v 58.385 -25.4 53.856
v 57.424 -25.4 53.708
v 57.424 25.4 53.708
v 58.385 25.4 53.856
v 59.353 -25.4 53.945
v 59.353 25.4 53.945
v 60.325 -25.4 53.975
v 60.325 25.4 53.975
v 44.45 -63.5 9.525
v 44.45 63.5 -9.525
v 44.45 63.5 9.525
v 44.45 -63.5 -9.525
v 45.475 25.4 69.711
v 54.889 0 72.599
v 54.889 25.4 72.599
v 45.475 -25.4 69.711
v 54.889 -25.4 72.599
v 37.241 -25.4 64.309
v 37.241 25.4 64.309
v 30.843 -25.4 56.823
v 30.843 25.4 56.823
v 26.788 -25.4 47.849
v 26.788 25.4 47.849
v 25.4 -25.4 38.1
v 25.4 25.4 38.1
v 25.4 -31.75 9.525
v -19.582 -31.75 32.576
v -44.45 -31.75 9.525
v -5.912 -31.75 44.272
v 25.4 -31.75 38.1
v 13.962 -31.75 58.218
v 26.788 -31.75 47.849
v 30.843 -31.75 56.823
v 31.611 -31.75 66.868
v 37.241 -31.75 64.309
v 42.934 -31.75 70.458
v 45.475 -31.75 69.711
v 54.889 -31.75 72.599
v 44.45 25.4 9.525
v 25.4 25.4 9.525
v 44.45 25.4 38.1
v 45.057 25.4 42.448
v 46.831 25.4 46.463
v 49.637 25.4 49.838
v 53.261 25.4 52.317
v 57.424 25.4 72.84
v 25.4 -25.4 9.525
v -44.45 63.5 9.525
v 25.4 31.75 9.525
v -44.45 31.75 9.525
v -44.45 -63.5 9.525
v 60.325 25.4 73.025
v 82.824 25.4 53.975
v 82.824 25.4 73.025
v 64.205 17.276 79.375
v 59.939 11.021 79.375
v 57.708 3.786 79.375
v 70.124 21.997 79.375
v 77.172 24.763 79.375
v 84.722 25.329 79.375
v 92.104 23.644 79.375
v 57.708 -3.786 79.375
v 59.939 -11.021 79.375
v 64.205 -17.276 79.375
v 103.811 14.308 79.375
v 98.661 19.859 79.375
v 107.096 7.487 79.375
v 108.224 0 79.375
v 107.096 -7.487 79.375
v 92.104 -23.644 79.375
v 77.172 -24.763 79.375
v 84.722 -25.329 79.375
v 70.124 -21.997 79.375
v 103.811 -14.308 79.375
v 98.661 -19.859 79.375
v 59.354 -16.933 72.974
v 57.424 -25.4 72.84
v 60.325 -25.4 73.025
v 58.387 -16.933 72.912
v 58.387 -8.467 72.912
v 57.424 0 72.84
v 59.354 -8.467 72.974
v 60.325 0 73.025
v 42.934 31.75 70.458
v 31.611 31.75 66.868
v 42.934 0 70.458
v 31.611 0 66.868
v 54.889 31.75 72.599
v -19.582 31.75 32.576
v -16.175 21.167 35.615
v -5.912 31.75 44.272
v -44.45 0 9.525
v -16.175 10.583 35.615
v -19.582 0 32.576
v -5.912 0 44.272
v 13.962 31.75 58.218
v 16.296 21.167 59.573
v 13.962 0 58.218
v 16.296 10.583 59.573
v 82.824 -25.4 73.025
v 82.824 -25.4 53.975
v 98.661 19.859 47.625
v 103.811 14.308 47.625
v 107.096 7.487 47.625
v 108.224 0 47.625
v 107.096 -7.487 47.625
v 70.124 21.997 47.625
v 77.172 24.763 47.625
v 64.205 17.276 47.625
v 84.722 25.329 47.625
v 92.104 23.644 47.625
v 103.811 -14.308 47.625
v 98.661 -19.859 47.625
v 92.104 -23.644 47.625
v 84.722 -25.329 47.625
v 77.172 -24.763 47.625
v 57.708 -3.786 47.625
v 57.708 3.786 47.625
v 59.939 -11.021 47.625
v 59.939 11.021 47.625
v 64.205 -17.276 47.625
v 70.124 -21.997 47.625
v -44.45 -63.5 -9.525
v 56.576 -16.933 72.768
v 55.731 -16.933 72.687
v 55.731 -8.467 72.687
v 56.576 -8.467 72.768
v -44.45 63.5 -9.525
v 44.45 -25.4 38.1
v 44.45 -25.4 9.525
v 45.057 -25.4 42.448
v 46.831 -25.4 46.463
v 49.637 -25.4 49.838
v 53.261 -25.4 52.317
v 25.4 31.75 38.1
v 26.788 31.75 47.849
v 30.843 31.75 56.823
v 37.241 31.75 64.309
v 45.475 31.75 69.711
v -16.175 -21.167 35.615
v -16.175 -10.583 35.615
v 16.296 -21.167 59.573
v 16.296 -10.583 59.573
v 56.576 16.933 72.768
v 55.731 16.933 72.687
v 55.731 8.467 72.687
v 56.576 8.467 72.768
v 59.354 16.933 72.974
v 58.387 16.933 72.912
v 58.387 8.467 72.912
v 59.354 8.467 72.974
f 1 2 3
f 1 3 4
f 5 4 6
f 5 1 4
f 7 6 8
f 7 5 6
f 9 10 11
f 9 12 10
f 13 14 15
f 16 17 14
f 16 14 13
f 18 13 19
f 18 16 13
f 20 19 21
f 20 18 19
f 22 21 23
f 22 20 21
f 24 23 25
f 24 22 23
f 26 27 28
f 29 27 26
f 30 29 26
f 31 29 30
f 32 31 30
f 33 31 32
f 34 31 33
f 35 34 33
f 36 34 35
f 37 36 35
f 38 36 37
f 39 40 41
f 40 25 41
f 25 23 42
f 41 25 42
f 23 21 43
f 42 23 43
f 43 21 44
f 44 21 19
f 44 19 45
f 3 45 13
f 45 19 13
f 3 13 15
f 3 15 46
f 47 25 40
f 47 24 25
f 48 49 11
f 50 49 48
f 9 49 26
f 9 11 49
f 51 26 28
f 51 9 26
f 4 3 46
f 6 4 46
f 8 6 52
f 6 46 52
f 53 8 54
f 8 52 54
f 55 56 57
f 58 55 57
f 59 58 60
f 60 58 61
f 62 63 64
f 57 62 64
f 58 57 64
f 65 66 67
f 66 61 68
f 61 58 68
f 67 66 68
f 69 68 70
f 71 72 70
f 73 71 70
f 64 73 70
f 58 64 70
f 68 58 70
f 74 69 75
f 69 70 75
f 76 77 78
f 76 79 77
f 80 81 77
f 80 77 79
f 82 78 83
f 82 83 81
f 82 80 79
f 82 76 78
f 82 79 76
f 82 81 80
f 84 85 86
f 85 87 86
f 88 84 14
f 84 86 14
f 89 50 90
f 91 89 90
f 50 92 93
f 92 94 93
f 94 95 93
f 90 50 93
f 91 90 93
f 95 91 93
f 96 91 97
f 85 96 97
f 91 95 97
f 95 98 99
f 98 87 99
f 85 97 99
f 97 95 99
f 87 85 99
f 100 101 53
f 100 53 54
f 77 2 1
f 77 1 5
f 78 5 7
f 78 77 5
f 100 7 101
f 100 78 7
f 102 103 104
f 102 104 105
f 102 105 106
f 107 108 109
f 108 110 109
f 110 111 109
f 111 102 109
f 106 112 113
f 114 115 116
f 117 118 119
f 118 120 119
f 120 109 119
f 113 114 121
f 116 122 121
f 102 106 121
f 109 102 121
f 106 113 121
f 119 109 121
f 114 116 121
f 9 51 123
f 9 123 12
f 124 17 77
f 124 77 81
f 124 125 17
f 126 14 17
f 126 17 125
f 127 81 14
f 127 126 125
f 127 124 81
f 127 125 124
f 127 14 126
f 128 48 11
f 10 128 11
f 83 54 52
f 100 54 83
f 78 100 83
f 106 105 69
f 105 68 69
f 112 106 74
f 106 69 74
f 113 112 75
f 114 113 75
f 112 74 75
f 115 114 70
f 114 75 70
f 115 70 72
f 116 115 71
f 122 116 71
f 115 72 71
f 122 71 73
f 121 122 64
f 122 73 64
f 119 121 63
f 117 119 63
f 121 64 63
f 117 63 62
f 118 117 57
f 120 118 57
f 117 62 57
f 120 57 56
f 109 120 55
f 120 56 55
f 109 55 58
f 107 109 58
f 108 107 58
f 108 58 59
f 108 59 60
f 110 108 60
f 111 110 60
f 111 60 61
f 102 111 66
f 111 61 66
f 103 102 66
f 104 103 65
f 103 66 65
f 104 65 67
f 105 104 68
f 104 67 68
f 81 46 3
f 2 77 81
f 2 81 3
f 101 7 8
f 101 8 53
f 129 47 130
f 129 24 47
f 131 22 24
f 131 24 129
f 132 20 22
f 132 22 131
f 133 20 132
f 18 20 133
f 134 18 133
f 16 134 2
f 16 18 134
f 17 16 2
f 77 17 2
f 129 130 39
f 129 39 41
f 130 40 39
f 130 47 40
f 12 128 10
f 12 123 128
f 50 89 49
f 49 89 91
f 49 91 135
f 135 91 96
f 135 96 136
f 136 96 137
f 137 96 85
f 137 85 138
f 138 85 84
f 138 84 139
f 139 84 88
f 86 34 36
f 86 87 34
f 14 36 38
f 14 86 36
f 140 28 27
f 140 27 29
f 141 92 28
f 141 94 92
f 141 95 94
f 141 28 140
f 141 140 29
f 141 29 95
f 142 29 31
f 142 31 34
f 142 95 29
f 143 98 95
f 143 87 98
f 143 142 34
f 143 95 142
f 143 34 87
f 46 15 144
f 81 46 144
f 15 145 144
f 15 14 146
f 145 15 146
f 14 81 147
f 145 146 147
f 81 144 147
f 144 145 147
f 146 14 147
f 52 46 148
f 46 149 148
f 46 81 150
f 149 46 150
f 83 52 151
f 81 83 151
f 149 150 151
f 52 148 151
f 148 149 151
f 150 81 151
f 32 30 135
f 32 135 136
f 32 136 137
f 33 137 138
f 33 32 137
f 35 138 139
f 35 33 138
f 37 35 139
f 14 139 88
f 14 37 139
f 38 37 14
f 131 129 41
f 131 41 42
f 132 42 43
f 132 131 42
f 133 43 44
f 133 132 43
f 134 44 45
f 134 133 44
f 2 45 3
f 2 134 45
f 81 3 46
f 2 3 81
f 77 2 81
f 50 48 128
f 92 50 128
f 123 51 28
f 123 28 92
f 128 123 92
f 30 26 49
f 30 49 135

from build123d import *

# Parameters (mm, degrees)
F1_DEPTH = 63.5
F2_DEPTH = 31.75
F3_DEPTH = 25.4
F5_DEPTH = 25.4


with BuildPart() as f1:
    # F0 (on Front) → F1 (new body, symmetric)
    with BuildSketch(Plane.XZ):
        Polygon((44.45, -9.525), (44.45, 9.525), (25.4, 9.525), (-44.45, 9.525), (-44.45, -9.525), align=None)
    extrude(amount=F1_DEPTH, both=True)

    # F0 (on Front) → F2 (join, symmetric)
    with BuildSketch(Plane.XZ):
        with BuildLine():
            Line((-44.45, 9.525), (25.4, 9.525))
            Line((25.4, 9.525), (25.4, 38.1))
            ThreePointArc((25.4, 38.1), (33.7768130044, 60.7924963864), (54.8888699925, 72.5993350014))
            add(Edge.make_bspline(
                [(-44.45, 9.525), (-17.630573516, 33.748828198), (12.5933430679, 67.9708407592), (54.8888699925, 72.5993350014)],
                knots=[0, 0, 0, 0, 117.5404990535, 117.5404990535, 117.5404990535, 117.5404990535], degree=3))
        make_face()
    extrude(amount=F2_DEPTH, both=True)


with BuildPart() as f3:
    # F0 (on Front) → F3 (new body, symmetric)
    with BuildSketch(Plane.XZ):
        with BuildLine():
            Line((57.4240950841, 72.8398465542), (57.4240950841, 53.7077024468))
            ThreePointArc((57.4240950841, 53.7077024468), (58.8684031689, 53.9080343709), (60.325, 53.975))
            Line((60.325, 53.975), (82.8240950841, 53.975))
            Line((82.8240950841, 53.975), (82.8240950841, 73.025))
            Line((82.8240950841, 73.025), (60.325, 73.025))
            add(Edge.make_bspline(
                [(57.4240950841, 72.8398465542), (58.3848548691, 72.9170376368), (59.3517904465, 72.9789049543), (60.325, 73.025)],
                knots=[119.8756830341, 119.8756830341, 119.8756830341, 119.8756830341, 122.515511773, 122.515511773, 122.515511773, 122.515511773], degree=3))
        make_face()
    extrude(amount=F3_DEPTH, both=True)


with BuildPart() as f4:
    # F0 (on Front) → F4 (revolve)
    with BuildSketch(Plane.XZ):
        Polygon((82.8240950841, 53.975), (82.8240950841, 47.625), (108.2240950841, 47.625), (108.2240950841, 79.375), (82.8240950841, 79.375), (82.8240950841, 73.025), align=None)
    revolve(axis=Axis((82.8240950841, 0, 63.5), (0, 0, -1)))


with BuildPart() as f5:
    # F0 (on Front) → F5 (new body, symmetric)
    with BuildSketch(Plane.XZ):
        with BuildLine():
            Line((25.4, 9.525), (44.45, 9.525))
            Line((44.45, 9.525), (44.45, 38.1))
            ThreePointArc((44.45, 38.1), (48.1170622024, 48.2479988042), (57.4240950841, 53.7077024468))
            Line((57.4240950841, 53.7077024468), (57.4240950841, 72.8398465542))
            add(Edge.make_bspline(
                [(54.8888699925, 72.5993350014), (55.7291577038, 72.6912895677), (56.5742100798, 72.7715635718), (57.4240950841, 72.8398465542)],
                knots=[117.5404990535, 117.5404990535, 117.5404990535, 117.5404990535, 119.8756830341, 119.8756830341, 119.8756830341, 119.8756830341], degree=3))
            ThreePointArc((54.8888699925, 72.5993350014), (33.7768130044, 60.7924963864), (25.4, 38.1))
            Line((25.4, 38.1), (25.4, 9.525))
        make_face()
    extrude(amount=F5_DEPTH, both=True)


solid = Compound([f1.part, f3.part, f4.part, f5.part])
